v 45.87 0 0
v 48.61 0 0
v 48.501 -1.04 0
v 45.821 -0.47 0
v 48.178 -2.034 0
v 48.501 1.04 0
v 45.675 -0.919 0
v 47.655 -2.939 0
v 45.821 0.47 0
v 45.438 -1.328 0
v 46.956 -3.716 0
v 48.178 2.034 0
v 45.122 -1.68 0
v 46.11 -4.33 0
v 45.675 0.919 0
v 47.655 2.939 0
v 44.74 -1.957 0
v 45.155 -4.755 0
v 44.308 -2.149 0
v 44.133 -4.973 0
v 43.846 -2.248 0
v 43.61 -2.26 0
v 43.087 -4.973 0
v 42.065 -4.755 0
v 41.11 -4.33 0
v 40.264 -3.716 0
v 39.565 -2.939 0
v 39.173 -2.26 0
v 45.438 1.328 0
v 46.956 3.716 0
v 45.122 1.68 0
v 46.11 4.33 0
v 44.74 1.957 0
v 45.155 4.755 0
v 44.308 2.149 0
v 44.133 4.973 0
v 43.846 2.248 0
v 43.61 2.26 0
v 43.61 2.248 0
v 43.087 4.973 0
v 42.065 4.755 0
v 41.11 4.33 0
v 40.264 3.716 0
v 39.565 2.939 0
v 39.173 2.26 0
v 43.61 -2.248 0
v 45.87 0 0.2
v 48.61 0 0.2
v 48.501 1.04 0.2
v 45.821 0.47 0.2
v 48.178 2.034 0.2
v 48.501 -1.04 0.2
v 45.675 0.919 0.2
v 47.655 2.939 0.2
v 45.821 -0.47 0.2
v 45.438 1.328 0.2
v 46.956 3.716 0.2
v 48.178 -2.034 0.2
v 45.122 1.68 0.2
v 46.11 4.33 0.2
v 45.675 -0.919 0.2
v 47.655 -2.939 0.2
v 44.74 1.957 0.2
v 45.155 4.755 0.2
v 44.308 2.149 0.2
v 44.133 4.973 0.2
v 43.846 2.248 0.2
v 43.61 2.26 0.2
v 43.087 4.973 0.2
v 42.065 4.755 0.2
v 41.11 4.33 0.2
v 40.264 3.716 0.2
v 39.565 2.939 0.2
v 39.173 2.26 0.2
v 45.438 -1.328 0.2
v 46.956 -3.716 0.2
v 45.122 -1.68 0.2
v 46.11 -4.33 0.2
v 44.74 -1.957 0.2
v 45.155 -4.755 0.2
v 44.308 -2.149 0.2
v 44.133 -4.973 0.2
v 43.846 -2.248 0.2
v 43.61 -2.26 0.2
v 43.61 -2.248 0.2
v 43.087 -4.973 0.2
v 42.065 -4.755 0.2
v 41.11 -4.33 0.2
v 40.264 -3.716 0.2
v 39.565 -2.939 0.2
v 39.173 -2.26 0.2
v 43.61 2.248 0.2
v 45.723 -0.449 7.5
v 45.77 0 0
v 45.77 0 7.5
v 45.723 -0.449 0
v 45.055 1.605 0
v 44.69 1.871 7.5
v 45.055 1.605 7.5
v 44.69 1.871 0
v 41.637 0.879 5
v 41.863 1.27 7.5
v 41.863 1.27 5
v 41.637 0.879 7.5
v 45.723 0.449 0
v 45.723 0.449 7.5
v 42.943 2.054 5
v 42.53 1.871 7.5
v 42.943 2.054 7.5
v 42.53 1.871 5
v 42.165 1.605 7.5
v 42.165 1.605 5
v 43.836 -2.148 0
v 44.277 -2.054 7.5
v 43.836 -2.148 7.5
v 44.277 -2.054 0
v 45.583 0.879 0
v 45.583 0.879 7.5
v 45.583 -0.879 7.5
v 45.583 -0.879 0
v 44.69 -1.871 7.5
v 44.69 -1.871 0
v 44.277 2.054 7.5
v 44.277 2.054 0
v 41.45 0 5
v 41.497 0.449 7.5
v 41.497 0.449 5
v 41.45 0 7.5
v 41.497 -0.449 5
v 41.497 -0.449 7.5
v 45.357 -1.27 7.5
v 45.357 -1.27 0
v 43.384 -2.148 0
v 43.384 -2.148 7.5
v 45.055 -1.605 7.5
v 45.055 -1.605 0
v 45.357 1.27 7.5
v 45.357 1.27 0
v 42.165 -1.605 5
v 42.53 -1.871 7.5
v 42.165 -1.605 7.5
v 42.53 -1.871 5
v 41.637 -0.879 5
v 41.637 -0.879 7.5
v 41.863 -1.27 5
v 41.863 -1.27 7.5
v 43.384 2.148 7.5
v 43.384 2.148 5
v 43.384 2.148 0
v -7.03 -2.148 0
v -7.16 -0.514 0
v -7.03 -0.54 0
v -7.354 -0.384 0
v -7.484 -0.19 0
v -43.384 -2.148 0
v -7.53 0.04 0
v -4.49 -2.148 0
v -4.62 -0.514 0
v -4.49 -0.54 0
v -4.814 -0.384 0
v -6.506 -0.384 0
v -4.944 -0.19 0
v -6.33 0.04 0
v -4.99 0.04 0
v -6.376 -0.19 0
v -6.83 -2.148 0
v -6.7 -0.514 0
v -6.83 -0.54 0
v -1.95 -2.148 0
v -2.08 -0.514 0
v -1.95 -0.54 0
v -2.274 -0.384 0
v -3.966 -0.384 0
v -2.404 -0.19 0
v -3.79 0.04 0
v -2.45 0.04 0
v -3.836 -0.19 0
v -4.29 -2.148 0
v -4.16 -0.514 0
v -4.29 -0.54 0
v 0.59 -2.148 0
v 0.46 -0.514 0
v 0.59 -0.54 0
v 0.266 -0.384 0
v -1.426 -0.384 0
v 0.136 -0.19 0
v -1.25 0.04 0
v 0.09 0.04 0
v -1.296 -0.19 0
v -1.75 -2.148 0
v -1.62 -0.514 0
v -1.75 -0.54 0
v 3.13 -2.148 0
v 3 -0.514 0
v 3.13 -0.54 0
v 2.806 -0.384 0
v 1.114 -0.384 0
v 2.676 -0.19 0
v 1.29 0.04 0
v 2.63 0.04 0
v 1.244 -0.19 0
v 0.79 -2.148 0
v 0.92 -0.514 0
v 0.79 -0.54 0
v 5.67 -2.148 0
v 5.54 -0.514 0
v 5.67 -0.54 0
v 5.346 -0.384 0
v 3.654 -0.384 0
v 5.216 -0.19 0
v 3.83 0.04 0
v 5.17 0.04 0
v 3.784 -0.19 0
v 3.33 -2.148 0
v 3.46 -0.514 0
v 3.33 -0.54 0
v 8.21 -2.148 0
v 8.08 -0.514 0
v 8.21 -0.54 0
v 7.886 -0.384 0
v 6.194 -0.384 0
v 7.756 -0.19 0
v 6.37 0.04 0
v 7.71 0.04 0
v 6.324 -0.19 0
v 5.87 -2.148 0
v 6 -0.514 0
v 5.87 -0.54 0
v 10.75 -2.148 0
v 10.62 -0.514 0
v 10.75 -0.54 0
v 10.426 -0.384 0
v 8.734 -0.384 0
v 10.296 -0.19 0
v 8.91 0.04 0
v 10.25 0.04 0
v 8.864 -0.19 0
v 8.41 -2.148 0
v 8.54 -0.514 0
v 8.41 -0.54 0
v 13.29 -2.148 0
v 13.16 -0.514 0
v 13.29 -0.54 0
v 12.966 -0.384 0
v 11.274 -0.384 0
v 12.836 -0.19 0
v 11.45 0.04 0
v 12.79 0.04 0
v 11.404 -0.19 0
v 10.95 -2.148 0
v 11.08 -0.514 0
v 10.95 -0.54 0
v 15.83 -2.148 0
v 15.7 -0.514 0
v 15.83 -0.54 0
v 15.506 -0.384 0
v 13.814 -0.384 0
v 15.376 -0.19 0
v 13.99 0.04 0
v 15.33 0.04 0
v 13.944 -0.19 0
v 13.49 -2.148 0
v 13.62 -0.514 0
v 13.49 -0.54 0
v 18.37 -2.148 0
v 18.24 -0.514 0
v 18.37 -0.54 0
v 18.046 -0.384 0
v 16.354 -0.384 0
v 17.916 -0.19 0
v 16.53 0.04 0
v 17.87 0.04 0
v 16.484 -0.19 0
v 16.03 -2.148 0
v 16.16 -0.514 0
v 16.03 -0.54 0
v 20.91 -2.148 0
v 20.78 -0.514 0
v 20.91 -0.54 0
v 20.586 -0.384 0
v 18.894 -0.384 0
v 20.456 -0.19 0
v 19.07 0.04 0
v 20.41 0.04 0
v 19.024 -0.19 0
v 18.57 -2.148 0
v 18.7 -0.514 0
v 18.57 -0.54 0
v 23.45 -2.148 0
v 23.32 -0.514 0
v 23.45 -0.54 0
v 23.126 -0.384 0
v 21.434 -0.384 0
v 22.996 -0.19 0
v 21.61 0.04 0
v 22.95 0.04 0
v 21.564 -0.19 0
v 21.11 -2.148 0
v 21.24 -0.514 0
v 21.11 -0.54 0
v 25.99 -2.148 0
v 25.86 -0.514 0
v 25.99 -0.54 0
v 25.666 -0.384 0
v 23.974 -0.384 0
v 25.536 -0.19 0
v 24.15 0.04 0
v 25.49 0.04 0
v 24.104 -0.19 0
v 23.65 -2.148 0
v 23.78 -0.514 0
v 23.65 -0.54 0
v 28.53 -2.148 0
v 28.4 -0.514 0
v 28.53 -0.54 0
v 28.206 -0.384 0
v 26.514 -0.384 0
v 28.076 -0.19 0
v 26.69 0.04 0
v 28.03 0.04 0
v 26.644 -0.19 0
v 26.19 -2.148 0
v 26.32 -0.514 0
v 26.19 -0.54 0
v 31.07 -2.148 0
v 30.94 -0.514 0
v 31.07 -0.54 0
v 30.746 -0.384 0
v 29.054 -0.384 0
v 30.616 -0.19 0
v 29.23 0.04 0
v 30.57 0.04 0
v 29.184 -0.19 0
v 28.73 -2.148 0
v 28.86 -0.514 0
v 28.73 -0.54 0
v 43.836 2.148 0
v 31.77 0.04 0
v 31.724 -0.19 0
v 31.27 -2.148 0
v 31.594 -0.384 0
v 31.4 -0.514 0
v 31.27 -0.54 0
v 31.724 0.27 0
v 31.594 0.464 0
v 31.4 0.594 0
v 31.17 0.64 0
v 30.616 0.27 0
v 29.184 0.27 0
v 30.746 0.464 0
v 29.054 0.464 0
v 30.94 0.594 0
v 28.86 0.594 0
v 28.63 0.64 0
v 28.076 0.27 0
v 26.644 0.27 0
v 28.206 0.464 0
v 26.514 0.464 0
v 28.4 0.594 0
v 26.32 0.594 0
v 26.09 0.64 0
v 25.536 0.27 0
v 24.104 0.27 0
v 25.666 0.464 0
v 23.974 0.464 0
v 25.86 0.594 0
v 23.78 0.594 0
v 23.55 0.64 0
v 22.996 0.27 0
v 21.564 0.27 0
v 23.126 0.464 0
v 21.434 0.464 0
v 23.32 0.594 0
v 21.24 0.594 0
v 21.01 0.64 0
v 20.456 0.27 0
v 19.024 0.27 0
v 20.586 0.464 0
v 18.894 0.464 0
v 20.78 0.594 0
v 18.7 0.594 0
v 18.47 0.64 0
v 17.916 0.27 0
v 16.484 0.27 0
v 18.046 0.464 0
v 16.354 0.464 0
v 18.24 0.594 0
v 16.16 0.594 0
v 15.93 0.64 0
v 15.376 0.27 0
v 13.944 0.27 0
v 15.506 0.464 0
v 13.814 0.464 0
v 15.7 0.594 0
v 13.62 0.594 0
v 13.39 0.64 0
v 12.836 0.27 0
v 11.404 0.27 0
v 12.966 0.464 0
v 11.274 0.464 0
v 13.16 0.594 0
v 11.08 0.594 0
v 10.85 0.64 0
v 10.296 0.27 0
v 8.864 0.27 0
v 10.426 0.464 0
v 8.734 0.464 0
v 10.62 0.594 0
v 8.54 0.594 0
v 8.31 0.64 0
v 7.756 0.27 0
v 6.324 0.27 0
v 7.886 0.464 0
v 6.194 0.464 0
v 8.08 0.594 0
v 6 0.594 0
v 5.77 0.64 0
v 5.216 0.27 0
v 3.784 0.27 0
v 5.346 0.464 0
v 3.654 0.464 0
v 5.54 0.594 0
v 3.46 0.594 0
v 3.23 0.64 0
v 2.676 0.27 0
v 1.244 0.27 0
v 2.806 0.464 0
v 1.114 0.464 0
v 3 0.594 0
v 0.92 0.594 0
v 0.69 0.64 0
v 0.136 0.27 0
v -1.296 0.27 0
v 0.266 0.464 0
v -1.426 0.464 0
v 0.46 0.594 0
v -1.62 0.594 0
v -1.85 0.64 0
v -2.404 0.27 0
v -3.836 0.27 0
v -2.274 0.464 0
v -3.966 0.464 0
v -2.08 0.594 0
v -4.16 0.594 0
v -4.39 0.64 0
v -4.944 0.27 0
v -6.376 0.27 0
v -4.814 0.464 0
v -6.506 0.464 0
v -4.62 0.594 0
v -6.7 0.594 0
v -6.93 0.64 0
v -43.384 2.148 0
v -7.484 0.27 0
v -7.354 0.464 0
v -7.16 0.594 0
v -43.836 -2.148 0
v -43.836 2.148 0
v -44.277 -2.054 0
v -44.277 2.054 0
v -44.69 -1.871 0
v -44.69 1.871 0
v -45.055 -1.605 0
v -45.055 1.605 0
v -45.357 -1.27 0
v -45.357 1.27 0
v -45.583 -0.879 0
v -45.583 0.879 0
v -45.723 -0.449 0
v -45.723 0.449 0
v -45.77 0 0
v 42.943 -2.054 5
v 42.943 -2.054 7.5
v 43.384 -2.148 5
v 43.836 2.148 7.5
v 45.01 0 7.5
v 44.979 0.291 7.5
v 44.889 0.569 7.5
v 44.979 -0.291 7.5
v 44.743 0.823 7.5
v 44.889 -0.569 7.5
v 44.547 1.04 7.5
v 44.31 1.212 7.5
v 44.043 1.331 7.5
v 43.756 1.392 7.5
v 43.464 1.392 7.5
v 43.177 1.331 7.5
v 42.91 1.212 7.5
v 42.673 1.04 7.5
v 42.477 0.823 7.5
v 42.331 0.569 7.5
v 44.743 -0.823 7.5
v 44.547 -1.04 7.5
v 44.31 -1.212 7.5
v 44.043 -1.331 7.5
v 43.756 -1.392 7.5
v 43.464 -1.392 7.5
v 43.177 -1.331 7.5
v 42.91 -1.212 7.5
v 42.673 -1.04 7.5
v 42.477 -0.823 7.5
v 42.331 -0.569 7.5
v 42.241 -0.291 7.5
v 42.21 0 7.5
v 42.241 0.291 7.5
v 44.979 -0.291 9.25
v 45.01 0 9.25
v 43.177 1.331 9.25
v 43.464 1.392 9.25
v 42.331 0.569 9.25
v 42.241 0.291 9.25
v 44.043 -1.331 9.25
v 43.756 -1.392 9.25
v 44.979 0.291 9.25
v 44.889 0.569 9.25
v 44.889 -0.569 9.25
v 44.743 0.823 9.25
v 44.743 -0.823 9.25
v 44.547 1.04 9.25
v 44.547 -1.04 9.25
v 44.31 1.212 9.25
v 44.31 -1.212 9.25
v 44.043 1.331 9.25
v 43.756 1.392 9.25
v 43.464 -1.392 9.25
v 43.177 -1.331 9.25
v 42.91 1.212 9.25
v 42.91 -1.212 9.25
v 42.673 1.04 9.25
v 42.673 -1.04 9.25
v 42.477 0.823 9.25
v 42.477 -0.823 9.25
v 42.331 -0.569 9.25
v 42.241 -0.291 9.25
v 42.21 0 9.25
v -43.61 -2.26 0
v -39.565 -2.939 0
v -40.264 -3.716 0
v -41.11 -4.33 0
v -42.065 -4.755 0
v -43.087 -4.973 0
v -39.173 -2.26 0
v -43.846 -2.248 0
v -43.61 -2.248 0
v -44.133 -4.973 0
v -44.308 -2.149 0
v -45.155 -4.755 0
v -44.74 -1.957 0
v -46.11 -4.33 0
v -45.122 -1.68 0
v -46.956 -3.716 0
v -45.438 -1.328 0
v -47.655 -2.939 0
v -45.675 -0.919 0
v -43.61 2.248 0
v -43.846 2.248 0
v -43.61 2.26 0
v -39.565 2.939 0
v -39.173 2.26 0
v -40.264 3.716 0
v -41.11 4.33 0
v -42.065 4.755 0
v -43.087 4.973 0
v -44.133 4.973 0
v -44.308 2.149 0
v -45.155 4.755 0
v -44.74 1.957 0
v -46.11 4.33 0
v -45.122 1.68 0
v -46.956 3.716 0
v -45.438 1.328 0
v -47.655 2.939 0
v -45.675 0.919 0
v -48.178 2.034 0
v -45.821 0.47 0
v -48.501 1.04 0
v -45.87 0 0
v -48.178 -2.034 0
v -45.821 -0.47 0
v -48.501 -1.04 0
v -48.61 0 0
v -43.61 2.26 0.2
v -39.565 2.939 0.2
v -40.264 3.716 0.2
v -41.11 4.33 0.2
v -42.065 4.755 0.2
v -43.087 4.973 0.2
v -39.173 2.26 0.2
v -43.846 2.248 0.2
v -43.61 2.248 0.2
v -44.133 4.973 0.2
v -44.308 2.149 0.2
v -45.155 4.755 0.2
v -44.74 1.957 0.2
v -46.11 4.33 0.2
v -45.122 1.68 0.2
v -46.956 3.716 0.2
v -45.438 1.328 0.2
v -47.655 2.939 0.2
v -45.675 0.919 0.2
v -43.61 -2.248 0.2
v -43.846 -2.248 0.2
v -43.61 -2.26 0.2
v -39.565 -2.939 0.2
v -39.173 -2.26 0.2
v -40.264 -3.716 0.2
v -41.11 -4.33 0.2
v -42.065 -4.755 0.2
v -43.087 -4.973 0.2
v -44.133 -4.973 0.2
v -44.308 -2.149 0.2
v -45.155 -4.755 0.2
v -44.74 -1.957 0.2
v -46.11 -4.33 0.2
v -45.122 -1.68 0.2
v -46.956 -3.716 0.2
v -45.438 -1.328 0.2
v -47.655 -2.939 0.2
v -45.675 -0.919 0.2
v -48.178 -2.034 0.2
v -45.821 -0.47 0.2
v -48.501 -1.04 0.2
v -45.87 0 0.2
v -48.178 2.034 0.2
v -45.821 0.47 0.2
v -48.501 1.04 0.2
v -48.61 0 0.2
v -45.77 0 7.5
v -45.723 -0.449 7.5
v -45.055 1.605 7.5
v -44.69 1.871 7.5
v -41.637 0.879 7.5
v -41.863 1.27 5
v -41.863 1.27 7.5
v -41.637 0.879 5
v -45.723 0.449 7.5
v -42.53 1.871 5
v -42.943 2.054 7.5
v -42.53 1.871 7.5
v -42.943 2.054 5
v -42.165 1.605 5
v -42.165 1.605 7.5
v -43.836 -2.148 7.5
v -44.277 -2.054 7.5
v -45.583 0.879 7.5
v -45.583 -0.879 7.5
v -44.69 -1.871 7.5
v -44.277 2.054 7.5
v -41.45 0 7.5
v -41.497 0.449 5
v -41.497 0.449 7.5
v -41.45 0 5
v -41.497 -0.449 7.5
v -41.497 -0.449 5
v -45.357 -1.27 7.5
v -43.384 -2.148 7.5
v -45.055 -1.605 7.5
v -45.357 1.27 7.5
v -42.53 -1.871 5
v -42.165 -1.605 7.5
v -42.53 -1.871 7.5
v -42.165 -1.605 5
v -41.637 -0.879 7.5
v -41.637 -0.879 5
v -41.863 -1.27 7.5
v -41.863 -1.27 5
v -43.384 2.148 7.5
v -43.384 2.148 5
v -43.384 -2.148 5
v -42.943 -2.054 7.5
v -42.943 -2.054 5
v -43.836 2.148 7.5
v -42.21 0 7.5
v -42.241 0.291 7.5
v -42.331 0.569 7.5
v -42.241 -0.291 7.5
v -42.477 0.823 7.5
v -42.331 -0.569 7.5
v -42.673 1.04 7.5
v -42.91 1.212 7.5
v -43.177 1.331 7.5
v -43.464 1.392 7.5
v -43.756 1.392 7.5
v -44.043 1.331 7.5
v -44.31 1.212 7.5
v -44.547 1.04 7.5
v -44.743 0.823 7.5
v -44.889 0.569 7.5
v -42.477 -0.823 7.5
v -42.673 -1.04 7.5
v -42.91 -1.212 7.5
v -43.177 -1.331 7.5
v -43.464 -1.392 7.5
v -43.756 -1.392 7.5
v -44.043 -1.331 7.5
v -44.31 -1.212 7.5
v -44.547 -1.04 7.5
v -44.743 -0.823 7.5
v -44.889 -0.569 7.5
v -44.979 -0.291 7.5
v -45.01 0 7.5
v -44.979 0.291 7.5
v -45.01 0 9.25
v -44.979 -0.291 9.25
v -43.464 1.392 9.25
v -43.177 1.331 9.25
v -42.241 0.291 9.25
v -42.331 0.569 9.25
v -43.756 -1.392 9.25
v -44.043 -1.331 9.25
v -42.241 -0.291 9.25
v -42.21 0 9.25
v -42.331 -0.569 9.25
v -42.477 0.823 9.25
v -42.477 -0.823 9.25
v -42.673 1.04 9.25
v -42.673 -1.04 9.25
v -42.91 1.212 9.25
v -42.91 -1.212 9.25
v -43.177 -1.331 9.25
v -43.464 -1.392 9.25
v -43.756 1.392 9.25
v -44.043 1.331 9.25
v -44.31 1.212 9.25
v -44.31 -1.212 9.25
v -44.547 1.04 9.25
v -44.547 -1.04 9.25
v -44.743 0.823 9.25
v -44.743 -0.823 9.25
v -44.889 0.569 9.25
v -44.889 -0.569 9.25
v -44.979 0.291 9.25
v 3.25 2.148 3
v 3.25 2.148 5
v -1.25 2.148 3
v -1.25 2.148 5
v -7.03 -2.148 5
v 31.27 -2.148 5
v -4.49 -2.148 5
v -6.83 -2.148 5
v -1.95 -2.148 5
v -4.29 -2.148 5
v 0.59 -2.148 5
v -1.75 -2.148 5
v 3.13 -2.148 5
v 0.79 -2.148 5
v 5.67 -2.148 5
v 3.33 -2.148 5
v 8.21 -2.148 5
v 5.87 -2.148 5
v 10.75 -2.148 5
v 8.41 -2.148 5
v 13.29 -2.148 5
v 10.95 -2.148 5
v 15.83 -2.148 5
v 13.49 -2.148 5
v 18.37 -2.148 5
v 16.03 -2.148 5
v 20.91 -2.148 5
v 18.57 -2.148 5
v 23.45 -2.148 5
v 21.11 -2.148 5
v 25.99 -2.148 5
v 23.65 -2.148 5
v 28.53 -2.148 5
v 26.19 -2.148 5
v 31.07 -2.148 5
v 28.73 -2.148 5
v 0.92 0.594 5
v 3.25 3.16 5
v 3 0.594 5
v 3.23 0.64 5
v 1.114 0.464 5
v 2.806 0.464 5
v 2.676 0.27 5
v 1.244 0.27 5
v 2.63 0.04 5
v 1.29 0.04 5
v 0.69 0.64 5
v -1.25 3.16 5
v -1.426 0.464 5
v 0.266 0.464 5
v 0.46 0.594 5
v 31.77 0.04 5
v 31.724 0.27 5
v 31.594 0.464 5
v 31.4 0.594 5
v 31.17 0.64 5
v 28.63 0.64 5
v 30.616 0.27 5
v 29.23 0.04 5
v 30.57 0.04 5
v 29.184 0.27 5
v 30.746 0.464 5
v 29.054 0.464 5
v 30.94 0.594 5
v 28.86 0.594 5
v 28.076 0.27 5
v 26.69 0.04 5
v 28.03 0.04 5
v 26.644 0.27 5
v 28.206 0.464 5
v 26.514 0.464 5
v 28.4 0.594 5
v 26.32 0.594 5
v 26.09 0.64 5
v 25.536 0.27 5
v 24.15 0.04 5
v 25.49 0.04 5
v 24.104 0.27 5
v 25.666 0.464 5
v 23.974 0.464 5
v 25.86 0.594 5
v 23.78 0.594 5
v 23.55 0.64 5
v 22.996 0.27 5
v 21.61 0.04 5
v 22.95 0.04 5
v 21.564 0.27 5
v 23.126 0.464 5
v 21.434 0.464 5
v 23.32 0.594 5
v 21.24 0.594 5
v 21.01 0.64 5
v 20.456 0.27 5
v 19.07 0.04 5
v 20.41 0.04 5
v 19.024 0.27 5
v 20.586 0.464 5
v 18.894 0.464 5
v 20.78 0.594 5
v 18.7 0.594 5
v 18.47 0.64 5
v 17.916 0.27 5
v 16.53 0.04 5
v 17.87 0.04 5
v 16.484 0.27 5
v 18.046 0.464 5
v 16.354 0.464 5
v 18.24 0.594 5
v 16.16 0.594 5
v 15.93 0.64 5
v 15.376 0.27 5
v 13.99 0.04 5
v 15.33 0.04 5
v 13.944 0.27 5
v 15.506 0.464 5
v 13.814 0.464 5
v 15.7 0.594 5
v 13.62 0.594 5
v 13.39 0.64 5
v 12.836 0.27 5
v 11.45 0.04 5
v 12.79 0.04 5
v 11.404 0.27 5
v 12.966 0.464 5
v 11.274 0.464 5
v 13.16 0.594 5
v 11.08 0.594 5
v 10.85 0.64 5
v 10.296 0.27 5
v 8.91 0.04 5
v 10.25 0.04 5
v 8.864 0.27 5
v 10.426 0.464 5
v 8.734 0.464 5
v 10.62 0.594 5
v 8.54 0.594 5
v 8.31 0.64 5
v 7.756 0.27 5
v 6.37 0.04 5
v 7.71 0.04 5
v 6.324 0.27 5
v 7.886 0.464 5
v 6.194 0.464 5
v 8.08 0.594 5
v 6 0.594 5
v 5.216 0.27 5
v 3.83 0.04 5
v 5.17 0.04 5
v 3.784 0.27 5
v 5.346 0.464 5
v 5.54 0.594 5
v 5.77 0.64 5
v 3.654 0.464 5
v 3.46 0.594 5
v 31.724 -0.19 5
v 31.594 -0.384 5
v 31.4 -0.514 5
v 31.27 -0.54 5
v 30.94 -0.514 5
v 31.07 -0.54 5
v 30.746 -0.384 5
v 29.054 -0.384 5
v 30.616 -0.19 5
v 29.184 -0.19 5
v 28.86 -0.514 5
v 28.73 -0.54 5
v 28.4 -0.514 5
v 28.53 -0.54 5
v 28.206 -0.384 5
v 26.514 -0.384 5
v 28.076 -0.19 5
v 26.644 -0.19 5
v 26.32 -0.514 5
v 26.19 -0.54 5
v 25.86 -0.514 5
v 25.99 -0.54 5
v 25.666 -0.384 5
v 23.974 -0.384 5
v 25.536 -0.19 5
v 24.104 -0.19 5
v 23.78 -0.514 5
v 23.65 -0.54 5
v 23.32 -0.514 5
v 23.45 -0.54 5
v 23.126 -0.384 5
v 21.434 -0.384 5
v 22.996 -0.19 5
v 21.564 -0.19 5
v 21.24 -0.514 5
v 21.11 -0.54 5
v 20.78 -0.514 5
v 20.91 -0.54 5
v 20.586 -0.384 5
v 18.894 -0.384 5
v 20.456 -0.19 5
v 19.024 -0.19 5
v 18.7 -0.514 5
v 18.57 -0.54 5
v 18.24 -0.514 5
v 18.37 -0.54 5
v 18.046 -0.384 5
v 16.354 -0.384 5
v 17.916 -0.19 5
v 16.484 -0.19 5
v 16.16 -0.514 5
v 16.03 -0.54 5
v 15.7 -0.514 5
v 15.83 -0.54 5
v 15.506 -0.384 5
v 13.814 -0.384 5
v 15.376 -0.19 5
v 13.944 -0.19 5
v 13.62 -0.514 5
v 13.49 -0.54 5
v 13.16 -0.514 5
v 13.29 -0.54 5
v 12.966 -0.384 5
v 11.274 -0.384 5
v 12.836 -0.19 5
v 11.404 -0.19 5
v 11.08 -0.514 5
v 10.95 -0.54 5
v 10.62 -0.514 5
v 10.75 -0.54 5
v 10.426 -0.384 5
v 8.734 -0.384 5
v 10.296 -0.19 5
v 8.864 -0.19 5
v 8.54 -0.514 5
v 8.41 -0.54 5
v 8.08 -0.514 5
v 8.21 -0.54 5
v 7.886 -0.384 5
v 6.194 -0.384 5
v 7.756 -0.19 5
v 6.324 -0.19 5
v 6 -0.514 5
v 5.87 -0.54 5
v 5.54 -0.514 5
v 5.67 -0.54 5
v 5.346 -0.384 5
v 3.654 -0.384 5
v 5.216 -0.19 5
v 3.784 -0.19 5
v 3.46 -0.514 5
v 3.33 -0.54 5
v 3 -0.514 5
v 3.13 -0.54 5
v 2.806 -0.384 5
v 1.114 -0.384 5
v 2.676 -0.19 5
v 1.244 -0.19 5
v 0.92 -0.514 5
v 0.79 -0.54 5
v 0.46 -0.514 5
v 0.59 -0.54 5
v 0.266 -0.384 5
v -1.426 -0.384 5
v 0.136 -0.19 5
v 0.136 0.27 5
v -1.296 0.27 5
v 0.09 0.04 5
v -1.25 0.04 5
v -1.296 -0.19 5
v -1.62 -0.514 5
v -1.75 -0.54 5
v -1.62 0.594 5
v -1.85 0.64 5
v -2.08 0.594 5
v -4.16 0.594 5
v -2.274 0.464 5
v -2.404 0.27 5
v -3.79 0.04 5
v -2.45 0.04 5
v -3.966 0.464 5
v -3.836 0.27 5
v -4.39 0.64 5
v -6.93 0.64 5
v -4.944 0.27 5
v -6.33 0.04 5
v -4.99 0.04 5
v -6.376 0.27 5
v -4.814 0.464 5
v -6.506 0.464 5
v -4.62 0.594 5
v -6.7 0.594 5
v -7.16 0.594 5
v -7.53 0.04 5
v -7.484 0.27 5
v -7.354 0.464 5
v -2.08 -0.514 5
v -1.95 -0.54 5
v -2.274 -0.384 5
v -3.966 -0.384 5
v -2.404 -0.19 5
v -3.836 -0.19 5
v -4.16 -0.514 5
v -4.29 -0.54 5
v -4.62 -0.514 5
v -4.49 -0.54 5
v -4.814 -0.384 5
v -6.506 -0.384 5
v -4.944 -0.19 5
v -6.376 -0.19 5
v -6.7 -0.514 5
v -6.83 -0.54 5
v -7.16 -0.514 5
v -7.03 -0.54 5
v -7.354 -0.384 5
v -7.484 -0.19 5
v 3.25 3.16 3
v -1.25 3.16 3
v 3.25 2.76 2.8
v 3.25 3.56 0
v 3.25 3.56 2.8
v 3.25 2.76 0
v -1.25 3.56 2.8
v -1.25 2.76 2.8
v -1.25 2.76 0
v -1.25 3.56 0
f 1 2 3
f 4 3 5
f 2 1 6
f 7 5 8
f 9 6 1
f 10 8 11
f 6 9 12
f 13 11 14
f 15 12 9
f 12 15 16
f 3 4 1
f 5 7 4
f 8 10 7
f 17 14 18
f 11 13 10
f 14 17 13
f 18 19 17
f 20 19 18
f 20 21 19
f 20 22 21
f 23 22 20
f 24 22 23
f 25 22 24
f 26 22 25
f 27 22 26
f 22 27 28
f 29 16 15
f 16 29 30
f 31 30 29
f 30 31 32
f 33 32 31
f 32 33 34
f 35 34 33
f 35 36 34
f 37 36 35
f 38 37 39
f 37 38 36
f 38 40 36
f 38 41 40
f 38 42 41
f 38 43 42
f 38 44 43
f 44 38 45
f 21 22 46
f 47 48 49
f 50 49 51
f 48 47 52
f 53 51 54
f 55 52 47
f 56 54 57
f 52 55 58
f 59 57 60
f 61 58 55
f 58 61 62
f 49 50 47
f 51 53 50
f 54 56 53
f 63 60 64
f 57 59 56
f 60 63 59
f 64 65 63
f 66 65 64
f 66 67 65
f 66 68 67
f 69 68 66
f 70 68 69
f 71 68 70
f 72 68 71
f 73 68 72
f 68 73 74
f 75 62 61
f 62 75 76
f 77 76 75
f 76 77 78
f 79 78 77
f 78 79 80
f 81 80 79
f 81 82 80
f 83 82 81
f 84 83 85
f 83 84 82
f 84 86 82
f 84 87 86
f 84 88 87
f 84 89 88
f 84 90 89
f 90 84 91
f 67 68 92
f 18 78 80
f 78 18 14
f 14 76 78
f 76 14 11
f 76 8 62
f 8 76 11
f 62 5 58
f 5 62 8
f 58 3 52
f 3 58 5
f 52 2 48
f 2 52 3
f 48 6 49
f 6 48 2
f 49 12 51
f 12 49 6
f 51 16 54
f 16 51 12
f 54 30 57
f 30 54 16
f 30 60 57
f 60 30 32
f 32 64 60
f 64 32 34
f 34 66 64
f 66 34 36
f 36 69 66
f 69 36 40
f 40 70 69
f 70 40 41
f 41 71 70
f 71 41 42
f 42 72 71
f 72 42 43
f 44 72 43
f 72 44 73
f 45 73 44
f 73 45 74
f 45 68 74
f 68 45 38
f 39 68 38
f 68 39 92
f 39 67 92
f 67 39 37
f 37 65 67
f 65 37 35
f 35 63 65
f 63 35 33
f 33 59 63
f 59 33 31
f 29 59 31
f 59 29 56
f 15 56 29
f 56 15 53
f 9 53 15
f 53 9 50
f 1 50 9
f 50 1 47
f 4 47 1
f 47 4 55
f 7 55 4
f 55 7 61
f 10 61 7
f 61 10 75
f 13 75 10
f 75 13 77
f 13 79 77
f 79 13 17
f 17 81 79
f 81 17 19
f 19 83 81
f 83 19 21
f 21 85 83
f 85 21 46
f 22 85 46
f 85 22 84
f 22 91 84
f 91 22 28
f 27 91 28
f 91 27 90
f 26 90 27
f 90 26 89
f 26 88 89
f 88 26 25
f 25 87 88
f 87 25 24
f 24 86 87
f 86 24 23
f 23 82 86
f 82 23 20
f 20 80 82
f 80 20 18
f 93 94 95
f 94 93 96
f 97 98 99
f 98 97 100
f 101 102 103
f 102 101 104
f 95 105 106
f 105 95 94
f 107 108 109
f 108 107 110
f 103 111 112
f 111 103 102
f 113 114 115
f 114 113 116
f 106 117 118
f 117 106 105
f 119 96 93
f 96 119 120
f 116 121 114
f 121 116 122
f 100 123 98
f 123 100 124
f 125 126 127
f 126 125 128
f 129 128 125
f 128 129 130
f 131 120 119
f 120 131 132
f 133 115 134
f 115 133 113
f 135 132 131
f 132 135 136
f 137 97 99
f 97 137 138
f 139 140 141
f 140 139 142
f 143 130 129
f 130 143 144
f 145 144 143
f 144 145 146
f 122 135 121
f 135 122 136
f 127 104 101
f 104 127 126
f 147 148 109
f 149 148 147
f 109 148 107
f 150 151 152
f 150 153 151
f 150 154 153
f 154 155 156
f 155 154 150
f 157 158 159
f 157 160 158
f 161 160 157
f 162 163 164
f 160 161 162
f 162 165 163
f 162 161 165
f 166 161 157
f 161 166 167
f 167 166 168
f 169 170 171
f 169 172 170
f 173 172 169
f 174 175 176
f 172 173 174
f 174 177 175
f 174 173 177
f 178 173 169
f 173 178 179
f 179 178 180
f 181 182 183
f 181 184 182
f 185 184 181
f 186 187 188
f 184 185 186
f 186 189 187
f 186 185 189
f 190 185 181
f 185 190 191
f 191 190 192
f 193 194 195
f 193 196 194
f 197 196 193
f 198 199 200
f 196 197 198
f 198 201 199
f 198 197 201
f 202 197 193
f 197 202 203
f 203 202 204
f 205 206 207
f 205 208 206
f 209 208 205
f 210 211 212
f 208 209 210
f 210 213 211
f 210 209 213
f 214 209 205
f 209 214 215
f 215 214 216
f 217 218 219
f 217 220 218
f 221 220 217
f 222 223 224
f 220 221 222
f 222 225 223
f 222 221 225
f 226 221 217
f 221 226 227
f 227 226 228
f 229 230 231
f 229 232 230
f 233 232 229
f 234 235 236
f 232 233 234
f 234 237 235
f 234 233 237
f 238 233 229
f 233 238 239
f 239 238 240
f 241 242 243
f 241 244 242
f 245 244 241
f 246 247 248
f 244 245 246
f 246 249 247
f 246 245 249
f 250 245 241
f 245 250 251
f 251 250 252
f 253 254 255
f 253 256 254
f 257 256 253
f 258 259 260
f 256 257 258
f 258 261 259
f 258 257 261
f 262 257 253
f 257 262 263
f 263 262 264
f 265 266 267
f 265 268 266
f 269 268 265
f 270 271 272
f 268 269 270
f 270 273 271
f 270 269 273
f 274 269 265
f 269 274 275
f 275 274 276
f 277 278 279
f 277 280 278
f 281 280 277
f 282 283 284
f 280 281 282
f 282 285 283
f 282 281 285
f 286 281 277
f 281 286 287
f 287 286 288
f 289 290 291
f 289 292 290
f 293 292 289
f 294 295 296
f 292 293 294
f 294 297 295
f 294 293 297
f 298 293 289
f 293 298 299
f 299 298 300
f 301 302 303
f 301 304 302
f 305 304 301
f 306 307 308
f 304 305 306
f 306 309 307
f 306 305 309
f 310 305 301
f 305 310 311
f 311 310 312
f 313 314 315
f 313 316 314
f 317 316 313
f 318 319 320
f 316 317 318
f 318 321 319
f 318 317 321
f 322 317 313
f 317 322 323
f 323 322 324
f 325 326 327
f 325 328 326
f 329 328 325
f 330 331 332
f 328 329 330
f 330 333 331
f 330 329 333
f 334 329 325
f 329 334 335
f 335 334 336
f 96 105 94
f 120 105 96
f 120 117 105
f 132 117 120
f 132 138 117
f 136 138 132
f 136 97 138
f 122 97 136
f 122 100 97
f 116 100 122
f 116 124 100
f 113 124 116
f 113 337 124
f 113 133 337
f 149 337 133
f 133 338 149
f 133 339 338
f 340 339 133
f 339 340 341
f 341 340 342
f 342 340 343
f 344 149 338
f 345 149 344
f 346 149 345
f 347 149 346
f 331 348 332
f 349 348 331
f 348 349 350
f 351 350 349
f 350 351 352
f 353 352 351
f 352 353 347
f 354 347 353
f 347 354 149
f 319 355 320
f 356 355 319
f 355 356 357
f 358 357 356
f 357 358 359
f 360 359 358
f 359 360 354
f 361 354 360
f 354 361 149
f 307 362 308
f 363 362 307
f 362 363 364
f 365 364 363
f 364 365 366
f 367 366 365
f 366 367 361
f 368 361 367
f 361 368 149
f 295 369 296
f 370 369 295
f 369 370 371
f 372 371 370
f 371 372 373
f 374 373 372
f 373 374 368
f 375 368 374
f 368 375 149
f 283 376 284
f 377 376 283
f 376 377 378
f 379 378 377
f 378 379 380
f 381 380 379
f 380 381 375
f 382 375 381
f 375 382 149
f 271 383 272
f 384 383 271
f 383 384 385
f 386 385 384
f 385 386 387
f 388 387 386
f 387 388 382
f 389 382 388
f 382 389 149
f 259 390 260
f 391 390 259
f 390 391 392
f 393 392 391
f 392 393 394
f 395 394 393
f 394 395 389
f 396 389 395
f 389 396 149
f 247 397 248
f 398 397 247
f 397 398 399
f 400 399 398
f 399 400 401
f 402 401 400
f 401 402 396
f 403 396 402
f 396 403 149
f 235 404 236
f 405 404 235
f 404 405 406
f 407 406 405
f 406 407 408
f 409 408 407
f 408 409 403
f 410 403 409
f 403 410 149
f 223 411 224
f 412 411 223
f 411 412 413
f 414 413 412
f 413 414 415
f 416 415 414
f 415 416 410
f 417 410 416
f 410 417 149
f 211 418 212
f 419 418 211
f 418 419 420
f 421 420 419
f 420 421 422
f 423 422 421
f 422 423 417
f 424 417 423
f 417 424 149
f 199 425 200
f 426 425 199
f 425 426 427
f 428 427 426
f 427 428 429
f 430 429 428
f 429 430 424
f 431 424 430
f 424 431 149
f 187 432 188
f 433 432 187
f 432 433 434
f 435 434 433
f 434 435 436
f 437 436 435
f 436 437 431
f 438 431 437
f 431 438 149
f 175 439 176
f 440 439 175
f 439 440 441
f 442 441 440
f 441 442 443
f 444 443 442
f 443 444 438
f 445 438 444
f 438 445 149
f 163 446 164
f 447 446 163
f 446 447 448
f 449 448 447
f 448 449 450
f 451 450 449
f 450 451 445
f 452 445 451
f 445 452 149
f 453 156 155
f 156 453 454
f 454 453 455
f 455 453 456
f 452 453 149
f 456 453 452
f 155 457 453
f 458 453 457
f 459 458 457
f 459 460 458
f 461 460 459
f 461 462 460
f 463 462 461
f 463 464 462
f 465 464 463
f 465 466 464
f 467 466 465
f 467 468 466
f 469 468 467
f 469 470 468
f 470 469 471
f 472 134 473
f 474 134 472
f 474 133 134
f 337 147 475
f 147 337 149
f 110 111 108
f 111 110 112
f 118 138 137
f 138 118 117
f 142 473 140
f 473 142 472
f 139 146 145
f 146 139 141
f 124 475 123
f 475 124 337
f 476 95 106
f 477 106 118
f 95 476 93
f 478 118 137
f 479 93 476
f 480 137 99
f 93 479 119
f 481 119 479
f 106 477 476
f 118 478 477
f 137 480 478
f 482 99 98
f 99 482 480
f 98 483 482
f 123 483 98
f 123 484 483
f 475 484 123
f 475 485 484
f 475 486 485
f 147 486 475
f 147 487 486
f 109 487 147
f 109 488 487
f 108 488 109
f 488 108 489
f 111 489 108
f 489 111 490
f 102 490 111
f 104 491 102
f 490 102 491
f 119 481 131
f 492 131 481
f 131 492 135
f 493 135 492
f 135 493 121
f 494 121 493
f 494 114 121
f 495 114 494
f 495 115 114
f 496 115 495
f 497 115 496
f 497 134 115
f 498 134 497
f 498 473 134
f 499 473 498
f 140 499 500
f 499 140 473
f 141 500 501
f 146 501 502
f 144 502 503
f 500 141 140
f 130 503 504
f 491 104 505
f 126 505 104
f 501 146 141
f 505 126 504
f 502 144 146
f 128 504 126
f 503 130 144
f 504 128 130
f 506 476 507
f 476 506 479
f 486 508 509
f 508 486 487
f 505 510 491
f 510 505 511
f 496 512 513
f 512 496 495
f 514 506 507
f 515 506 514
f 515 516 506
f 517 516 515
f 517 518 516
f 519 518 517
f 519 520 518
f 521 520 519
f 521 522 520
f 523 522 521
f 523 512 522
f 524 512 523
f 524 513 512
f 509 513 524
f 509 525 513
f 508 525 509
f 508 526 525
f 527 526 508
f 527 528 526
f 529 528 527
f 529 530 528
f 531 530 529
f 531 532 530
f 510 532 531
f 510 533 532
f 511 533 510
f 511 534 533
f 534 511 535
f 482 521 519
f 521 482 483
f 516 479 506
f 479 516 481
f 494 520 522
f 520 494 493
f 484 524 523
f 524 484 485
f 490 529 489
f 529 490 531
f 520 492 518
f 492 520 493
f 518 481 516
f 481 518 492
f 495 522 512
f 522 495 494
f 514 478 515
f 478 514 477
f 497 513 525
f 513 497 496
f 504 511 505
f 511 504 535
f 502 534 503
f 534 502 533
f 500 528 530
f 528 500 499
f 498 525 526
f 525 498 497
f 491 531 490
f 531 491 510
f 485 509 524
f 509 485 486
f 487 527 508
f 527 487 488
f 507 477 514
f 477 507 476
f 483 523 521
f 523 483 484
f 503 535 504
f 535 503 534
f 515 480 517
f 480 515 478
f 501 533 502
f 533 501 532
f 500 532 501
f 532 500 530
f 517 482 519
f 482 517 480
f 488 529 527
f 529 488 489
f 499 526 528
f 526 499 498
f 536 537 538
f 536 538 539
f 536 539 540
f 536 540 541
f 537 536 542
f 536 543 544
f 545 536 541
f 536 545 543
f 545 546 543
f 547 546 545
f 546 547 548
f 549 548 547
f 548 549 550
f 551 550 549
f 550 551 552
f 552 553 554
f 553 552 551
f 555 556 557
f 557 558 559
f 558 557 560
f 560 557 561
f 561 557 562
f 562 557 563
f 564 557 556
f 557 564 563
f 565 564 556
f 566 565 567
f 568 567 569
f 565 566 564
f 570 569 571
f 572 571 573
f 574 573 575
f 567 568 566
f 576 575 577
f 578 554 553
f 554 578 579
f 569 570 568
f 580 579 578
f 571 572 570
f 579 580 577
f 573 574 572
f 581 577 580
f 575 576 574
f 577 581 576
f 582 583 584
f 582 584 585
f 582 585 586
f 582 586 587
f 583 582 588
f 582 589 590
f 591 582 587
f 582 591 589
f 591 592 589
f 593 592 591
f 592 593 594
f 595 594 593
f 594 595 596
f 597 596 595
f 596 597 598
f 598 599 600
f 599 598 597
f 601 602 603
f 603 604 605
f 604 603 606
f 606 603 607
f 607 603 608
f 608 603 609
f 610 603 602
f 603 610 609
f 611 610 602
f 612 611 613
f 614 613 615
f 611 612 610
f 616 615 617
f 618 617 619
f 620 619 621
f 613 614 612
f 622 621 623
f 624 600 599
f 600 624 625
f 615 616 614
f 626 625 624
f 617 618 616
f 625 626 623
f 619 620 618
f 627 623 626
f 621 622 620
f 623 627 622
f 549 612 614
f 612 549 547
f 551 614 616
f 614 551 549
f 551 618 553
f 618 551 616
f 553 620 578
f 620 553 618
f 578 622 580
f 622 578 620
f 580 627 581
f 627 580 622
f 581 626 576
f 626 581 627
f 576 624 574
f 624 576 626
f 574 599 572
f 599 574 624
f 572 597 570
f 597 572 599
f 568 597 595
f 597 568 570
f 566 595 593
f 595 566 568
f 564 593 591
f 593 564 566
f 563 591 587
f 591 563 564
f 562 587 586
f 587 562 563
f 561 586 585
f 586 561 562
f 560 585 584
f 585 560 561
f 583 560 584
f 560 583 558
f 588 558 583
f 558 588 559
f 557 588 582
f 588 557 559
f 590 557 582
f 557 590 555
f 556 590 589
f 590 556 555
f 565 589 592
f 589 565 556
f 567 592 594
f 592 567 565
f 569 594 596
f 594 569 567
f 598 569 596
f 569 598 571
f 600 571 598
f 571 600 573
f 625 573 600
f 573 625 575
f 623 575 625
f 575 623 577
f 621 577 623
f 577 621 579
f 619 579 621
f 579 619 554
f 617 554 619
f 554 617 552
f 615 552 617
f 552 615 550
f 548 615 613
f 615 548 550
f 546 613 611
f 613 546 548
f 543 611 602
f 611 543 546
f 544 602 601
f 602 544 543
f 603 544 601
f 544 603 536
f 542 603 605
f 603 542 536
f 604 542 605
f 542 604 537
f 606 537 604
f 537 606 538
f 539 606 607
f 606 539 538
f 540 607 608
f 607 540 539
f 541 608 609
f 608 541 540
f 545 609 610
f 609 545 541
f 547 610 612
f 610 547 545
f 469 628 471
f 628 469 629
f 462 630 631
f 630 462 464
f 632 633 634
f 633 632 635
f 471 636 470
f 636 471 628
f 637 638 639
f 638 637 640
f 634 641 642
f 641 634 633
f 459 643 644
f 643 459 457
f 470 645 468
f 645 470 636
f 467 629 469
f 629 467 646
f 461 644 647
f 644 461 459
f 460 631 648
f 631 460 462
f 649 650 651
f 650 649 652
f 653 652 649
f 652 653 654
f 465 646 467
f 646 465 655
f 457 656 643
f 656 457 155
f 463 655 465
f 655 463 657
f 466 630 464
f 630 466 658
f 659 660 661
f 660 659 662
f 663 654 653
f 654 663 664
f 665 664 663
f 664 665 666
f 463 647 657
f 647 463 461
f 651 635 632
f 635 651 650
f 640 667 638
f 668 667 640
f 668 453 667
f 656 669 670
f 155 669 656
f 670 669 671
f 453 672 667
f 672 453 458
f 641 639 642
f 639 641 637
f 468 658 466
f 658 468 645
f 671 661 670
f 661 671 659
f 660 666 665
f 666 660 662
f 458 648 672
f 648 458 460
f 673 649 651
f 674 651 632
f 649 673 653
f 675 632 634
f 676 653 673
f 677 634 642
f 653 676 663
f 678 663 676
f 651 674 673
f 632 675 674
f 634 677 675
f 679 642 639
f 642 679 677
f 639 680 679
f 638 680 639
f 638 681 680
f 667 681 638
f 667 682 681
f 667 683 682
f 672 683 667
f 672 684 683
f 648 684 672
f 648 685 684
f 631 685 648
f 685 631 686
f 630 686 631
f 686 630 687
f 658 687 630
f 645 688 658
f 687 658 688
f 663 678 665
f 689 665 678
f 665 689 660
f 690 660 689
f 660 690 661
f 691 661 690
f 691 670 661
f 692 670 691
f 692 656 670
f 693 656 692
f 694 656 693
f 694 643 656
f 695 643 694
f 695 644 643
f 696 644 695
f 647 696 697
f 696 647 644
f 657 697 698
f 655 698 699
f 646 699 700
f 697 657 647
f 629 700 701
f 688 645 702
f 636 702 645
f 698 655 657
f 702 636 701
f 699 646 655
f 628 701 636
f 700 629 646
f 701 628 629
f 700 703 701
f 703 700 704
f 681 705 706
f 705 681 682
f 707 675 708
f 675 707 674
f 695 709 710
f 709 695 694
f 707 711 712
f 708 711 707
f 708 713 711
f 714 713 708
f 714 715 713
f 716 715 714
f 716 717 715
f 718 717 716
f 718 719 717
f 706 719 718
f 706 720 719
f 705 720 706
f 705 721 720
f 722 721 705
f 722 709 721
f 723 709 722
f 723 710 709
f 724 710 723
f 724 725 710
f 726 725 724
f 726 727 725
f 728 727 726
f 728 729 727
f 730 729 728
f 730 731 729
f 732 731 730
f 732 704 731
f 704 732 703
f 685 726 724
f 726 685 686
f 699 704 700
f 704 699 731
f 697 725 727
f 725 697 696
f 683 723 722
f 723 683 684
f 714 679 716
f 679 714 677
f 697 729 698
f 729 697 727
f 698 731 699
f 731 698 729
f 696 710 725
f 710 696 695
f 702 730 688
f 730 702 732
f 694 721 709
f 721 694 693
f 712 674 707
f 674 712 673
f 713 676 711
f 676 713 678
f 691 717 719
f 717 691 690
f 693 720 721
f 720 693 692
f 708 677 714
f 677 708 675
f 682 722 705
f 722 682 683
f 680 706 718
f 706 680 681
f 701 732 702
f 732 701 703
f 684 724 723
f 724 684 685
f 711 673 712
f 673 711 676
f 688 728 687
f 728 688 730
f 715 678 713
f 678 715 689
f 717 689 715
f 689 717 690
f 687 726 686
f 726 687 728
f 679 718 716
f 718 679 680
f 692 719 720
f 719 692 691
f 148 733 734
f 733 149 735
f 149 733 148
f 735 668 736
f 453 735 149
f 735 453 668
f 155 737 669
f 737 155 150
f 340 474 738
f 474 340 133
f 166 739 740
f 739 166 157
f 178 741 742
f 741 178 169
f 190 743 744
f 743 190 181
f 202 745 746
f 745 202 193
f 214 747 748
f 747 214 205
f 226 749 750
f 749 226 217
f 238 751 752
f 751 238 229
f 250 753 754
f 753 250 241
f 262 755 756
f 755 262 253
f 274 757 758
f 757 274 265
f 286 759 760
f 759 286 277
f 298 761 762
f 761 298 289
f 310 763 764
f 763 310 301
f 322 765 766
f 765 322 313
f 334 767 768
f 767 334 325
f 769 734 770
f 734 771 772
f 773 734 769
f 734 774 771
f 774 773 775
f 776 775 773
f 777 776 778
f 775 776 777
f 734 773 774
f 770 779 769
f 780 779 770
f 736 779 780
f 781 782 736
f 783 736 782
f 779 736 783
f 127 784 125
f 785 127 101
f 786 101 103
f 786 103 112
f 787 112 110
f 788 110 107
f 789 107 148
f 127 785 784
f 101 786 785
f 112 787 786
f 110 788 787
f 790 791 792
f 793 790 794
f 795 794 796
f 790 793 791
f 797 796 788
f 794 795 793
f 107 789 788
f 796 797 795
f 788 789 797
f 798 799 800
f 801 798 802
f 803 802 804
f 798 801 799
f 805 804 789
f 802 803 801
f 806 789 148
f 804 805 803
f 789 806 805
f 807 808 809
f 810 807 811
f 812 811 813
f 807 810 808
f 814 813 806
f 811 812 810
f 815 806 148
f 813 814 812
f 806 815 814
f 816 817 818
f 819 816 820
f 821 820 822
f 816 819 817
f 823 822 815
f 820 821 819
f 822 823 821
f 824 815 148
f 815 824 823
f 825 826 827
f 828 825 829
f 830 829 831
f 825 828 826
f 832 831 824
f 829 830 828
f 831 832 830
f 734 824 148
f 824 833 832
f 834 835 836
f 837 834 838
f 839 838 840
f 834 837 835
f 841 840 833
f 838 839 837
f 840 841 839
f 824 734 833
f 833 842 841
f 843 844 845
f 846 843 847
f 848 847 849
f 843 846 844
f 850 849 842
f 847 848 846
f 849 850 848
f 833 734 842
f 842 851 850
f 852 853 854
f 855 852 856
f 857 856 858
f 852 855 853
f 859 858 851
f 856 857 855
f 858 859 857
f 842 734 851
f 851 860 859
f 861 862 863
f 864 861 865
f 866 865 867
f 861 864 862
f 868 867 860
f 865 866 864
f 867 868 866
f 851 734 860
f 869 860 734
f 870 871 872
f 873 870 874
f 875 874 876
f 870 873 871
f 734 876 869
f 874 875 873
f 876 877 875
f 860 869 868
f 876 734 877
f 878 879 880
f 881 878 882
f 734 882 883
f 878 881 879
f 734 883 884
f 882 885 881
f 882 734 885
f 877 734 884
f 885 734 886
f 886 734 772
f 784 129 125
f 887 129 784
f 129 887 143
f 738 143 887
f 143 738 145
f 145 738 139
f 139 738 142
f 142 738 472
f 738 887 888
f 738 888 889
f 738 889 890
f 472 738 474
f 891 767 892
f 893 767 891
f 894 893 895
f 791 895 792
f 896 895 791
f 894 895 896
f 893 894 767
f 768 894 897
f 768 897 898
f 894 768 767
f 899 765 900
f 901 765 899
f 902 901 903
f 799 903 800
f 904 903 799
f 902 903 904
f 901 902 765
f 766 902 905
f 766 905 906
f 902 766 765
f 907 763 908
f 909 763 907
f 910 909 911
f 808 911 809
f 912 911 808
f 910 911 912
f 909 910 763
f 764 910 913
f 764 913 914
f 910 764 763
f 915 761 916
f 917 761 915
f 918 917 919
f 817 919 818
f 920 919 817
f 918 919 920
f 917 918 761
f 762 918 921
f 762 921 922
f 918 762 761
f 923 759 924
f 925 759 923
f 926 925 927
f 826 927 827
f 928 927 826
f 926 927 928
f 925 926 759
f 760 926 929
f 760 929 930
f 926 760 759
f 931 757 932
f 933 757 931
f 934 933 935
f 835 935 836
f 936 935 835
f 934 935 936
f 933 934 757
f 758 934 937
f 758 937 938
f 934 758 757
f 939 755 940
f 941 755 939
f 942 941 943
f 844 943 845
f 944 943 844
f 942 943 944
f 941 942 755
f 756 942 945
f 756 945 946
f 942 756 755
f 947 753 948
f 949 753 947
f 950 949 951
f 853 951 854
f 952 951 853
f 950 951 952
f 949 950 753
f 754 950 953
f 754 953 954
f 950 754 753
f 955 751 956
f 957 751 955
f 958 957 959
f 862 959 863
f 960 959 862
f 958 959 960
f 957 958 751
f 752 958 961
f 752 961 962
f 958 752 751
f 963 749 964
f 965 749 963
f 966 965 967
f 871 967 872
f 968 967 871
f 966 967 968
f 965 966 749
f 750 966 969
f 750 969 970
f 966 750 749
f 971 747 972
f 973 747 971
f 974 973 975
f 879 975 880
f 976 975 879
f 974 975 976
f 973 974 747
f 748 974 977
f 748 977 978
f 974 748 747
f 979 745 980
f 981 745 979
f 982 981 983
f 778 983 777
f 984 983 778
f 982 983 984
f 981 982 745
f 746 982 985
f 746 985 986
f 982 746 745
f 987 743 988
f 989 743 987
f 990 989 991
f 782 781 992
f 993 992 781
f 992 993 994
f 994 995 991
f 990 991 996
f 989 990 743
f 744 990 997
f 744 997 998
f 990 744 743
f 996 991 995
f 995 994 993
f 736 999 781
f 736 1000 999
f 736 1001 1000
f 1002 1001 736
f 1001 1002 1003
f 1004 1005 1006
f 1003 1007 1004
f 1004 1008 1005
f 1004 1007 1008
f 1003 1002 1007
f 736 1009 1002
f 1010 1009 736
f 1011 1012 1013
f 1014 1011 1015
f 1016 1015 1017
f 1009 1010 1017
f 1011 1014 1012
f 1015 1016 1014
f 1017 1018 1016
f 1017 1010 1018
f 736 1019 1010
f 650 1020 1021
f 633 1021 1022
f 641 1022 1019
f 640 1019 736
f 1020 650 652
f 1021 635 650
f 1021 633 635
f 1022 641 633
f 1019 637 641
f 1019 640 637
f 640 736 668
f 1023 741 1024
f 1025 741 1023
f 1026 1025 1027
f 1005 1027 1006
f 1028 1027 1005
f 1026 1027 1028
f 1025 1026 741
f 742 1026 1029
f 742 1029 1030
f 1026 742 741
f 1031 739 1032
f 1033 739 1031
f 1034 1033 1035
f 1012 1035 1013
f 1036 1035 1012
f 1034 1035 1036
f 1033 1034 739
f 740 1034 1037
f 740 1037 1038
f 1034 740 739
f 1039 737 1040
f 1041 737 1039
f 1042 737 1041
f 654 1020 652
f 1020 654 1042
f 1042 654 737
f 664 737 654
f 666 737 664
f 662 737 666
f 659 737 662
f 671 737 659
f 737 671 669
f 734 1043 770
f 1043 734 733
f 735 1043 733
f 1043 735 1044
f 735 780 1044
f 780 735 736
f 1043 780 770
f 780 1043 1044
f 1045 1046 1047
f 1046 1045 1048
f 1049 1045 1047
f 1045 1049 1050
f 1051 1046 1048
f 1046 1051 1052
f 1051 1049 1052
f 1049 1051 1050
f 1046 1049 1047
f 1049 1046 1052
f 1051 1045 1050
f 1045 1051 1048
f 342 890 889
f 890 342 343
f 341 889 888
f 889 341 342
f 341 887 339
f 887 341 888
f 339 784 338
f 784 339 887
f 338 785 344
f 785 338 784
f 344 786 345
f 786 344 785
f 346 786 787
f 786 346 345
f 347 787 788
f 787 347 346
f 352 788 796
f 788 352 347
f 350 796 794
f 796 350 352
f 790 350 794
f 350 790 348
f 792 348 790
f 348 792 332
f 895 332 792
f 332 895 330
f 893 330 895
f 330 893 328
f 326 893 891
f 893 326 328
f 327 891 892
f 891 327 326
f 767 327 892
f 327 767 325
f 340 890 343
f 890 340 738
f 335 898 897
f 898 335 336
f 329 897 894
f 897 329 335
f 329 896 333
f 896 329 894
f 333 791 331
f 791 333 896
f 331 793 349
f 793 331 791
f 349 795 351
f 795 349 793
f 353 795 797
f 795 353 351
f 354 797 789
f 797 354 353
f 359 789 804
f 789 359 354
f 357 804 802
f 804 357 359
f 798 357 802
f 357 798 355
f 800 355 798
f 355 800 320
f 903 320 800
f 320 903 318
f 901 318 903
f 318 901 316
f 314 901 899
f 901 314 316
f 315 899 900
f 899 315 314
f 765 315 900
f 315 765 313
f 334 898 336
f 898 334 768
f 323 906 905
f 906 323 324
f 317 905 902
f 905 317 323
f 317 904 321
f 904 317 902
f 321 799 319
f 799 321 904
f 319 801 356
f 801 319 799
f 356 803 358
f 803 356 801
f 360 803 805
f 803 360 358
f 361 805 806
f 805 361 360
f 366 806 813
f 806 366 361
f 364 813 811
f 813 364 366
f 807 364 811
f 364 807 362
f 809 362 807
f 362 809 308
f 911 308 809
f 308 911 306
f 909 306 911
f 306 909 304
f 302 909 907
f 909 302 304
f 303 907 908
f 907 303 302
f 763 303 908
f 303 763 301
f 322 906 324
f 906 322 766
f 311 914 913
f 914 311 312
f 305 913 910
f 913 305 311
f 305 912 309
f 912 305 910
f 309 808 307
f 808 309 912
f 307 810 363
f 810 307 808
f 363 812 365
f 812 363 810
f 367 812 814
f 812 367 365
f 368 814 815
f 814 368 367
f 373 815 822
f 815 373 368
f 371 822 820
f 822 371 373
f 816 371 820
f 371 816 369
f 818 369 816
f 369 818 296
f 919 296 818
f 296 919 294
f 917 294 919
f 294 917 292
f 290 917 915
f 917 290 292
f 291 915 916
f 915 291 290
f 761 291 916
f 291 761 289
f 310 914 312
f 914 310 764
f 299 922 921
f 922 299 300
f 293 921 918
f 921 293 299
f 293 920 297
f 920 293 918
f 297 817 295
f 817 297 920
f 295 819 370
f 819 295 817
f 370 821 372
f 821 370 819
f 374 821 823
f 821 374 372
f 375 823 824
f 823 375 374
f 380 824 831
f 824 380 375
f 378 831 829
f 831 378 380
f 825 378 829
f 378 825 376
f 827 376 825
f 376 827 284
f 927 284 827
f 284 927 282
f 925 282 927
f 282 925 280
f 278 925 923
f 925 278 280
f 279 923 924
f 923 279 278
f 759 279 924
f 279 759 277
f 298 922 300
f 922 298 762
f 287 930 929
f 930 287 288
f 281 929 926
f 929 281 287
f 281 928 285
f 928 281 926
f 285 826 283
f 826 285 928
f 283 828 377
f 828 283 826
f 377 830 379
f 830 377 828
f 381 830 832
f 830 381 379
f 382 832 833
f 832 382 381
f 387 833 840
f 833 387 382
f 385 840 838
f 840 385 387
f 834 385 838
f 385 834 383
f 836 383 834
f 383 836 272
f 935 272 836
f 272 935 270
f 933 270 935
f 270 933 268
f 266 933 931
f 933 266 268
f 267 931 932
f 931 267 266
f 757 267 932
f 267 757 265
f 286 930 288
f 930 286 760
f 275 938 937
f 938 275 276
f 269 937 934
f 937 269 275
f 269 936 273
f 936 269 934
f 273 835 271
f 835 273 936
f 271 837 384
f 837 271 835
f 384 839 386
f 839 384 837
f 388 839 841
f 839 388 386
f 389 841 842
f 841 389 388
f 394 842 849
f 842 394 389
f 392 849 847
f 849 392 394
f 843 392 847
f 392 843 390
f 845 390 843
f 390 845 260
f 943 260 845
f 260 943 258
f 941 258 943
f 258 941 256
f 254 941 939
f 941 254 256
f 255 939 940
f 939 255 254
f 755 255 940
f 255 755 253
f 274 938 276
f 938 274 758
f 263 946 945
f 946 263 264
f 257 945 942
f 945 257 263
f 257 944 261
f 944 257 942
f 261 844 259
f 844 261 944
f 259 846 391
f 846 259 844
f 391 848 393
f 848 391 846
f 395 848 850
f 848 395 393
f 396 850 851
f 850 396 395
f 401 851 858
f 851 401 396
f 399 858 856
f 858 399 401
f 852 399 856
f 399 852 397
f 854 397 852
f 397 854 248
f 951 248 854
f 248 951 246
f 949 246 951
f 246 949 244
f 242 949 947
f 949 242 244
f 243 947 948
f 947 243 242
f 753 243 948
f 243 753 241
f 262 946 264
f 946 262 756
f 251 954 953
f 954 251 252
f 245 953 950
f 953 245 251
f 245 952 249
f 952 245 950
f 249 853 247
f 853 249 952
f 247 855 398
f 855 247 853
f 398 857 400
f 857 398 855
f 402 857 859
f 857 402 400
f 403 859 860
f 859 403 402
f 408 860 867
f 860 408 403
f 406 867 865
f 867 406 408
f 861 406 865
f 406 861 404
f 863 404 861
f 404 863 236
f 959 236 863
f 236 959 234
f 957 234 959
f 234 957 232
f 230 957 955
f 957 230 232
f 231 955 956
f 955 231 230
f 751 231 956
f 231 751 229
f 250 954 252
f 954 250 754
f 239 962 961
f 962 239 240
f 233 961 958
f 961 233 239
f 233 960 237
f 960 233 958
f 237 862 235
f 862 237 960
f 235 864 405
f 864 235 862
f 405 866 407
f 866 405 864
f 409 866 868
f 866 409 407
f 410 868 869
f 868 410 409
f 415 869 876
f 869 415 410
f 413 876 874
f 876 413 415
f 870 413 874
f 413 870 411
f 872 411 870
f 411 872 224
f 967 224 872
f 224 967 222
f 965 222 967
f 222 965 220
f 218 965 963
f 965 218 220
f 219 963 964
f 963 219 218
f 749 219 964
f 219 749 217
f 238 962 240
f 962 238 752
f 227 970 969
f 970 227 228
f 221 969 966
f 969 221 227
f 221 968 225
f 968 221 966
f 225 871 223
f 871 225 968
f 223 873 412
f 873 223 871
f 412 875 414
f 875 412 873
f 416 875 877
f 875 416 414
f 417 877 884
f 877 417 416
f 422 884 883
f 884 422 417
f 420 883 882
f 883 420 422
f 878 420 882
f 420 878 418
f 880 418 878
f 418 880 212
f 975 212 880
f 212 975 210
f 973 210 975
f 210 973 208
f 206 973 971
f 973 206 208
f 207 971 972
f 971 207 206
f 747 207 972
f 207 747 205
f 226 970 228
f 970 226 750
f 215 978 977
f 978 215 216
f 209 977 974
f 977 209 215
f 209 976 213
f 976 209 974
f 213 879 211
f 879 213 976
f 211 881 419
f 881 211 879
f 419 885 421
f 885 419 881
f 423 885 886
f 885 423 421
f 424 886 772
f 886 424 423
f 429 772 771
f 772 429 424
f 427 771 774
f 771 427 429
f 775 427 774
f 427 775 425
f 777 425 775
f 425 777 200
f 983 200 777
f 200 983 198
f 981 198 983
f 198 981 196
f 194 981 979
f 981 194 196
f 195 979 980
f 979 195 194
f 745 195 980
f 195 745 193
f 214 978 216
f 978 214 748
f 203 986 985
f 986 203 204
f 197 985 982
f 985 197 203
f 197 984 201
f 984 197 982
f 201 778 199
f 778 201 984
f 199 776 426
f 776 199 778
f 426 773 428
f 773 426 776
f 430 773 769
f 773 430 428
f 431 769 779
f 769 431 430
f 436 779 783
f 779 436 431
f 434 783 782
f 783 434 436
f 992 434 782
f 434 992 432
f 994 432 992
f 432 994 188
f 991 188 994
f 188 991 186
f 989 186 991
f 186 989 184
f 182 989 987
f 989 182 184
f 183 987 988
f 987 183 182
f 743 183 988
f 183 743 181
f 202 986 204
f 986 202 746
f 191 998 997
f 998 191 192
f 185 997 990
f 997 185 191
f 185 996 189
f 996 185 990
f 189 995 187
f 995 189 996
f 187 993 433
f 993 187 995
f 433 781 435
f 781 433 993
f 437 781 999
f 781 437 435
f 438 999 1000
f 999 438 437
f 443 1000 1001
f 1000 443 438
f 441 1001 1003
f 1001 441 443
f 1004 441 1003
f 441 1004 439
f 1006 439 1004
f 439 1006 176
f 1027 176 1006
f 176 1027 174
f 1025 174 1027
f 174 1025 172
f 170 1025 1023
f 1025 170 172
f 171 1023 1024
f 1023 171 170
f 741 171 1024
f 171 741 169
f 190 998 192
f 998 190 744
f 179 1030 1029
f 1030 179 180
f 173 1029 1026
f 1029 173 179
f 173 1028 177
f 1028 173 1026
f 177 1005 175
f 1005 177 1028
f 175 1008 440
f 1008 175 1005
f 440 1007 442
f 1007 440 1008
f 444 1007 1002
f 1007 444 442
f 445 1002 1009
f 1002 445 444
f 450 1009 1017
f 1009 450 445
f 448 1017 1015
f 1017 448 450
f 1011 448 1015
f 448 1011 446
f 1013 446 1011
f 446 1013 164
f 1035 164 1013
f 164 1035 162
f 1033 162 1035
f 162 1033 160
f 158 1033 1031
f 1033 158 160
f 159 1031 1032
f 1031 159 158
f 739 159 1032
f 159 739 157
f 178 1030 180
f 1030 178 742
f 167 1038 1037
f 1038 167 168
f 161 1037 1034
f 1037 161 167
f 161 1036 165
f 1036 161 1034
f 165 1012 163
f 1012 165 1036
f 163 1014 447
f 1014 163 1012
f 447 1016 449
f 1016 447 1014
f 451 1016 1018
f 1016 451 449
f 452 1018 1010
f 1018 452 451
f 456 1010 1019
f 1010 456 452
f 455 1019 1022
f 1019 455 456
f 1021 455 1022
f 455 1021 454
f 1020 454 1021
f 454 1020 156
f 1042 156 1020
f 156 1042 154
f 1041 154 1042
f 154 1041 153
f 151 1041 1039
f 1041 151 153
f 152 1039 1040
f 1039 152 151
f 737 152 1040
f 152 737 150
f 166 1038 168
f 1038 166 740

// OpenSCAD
board_width = 25.83;
board_length = 91.54;
board_thickness = 1.75;

//these should be largely unnecessary, except clearance
holder_length = 77;
holder_width = 21;
holder_tolerance = 1;
holder_clearance = 20;

pin_start_distance = 14.6;
pin_edge_distance = 2.2;
pin_pitch = 2.54;

// 12 and 14 are extra 3v3 and Ground pins
// we leave them out to avoid print issues
pin_positions = [0:15];

corner_hole_diameter = 3;
corner_hole_radius = corner_hole_diameter/2;
corner_hole_inset_radius = 0.66;
outer_corner_r = corner_hole_diameter/2 + corner_hole_inset_radius;
peg_tolerance = 0.1;

pin_grasp_length = 5;
pin_press_length = 2.5;
pin_hole = 1.2;

$fs=0.25;

brim_height = 0.2;
brim_distance = 0.2;
brim_r=5;
brim_gap = 0.1;

tab_width = 4.5;
tab_height = 4.5;
tab_depth = 1;

module mirrored () {
  union () {
    children();
    mirror([1,0]) children();
  }
}

difference () {
  union() {
    linear_extrude(pin_grasp_length) hull() mirrored()
      translate([board_length/2-outer_corner_r,0]) circle(r=outer_corner_r);
    mirrored() translate([board_length/2-outer_corner_r,0]) {
      linear_extrude(brim_height) difference() {
        circle(r=brim_r);
        circle(r=outer_corner_r+brim_gap);
        translate([-brim_r-1,-outer_corner_r-brim_gap]) square([brim_r+1,2*outer_corner_r+2*brim_gap]);
      }
      linear_extrude(pin_grasp_length+pin_press_length) circle(r=outer_corner_r);
      linear_extrude(pin_grasp_length+pin_press_length+board_thickness) circle(r=corner_hole_radius - peg_tolerance);
    }
    translate([1,outer_corner_r+tab_depth/2-.1,pin_grasp_length-(tab_height-pin_press_length)/2]) cube([tab_width,tab_depth+.2,tab_height-pin_press_length],center=true);
    translate([1-tab_width/2,outer_corner_r+tab_depth-0.4,0]) cube([tab_width,0.8,pin_grasp_length-(tab_height-pin_press_length)-0.2]);
  }
  translate([0,0,-.5]) linear_extrude(pin_grasp_length+1) mirror([1,0,0]) union() {
    for (x=pin_positions) {
      translate([-board_length/2+pin_start_distance+pin_pitch*x, -outer_corner_r+pin_edge_distance]) {
        circle(d=pin_hole);
        translate([-0.1,-5]) square([0.2,5]);
      }
    }
  }
}
